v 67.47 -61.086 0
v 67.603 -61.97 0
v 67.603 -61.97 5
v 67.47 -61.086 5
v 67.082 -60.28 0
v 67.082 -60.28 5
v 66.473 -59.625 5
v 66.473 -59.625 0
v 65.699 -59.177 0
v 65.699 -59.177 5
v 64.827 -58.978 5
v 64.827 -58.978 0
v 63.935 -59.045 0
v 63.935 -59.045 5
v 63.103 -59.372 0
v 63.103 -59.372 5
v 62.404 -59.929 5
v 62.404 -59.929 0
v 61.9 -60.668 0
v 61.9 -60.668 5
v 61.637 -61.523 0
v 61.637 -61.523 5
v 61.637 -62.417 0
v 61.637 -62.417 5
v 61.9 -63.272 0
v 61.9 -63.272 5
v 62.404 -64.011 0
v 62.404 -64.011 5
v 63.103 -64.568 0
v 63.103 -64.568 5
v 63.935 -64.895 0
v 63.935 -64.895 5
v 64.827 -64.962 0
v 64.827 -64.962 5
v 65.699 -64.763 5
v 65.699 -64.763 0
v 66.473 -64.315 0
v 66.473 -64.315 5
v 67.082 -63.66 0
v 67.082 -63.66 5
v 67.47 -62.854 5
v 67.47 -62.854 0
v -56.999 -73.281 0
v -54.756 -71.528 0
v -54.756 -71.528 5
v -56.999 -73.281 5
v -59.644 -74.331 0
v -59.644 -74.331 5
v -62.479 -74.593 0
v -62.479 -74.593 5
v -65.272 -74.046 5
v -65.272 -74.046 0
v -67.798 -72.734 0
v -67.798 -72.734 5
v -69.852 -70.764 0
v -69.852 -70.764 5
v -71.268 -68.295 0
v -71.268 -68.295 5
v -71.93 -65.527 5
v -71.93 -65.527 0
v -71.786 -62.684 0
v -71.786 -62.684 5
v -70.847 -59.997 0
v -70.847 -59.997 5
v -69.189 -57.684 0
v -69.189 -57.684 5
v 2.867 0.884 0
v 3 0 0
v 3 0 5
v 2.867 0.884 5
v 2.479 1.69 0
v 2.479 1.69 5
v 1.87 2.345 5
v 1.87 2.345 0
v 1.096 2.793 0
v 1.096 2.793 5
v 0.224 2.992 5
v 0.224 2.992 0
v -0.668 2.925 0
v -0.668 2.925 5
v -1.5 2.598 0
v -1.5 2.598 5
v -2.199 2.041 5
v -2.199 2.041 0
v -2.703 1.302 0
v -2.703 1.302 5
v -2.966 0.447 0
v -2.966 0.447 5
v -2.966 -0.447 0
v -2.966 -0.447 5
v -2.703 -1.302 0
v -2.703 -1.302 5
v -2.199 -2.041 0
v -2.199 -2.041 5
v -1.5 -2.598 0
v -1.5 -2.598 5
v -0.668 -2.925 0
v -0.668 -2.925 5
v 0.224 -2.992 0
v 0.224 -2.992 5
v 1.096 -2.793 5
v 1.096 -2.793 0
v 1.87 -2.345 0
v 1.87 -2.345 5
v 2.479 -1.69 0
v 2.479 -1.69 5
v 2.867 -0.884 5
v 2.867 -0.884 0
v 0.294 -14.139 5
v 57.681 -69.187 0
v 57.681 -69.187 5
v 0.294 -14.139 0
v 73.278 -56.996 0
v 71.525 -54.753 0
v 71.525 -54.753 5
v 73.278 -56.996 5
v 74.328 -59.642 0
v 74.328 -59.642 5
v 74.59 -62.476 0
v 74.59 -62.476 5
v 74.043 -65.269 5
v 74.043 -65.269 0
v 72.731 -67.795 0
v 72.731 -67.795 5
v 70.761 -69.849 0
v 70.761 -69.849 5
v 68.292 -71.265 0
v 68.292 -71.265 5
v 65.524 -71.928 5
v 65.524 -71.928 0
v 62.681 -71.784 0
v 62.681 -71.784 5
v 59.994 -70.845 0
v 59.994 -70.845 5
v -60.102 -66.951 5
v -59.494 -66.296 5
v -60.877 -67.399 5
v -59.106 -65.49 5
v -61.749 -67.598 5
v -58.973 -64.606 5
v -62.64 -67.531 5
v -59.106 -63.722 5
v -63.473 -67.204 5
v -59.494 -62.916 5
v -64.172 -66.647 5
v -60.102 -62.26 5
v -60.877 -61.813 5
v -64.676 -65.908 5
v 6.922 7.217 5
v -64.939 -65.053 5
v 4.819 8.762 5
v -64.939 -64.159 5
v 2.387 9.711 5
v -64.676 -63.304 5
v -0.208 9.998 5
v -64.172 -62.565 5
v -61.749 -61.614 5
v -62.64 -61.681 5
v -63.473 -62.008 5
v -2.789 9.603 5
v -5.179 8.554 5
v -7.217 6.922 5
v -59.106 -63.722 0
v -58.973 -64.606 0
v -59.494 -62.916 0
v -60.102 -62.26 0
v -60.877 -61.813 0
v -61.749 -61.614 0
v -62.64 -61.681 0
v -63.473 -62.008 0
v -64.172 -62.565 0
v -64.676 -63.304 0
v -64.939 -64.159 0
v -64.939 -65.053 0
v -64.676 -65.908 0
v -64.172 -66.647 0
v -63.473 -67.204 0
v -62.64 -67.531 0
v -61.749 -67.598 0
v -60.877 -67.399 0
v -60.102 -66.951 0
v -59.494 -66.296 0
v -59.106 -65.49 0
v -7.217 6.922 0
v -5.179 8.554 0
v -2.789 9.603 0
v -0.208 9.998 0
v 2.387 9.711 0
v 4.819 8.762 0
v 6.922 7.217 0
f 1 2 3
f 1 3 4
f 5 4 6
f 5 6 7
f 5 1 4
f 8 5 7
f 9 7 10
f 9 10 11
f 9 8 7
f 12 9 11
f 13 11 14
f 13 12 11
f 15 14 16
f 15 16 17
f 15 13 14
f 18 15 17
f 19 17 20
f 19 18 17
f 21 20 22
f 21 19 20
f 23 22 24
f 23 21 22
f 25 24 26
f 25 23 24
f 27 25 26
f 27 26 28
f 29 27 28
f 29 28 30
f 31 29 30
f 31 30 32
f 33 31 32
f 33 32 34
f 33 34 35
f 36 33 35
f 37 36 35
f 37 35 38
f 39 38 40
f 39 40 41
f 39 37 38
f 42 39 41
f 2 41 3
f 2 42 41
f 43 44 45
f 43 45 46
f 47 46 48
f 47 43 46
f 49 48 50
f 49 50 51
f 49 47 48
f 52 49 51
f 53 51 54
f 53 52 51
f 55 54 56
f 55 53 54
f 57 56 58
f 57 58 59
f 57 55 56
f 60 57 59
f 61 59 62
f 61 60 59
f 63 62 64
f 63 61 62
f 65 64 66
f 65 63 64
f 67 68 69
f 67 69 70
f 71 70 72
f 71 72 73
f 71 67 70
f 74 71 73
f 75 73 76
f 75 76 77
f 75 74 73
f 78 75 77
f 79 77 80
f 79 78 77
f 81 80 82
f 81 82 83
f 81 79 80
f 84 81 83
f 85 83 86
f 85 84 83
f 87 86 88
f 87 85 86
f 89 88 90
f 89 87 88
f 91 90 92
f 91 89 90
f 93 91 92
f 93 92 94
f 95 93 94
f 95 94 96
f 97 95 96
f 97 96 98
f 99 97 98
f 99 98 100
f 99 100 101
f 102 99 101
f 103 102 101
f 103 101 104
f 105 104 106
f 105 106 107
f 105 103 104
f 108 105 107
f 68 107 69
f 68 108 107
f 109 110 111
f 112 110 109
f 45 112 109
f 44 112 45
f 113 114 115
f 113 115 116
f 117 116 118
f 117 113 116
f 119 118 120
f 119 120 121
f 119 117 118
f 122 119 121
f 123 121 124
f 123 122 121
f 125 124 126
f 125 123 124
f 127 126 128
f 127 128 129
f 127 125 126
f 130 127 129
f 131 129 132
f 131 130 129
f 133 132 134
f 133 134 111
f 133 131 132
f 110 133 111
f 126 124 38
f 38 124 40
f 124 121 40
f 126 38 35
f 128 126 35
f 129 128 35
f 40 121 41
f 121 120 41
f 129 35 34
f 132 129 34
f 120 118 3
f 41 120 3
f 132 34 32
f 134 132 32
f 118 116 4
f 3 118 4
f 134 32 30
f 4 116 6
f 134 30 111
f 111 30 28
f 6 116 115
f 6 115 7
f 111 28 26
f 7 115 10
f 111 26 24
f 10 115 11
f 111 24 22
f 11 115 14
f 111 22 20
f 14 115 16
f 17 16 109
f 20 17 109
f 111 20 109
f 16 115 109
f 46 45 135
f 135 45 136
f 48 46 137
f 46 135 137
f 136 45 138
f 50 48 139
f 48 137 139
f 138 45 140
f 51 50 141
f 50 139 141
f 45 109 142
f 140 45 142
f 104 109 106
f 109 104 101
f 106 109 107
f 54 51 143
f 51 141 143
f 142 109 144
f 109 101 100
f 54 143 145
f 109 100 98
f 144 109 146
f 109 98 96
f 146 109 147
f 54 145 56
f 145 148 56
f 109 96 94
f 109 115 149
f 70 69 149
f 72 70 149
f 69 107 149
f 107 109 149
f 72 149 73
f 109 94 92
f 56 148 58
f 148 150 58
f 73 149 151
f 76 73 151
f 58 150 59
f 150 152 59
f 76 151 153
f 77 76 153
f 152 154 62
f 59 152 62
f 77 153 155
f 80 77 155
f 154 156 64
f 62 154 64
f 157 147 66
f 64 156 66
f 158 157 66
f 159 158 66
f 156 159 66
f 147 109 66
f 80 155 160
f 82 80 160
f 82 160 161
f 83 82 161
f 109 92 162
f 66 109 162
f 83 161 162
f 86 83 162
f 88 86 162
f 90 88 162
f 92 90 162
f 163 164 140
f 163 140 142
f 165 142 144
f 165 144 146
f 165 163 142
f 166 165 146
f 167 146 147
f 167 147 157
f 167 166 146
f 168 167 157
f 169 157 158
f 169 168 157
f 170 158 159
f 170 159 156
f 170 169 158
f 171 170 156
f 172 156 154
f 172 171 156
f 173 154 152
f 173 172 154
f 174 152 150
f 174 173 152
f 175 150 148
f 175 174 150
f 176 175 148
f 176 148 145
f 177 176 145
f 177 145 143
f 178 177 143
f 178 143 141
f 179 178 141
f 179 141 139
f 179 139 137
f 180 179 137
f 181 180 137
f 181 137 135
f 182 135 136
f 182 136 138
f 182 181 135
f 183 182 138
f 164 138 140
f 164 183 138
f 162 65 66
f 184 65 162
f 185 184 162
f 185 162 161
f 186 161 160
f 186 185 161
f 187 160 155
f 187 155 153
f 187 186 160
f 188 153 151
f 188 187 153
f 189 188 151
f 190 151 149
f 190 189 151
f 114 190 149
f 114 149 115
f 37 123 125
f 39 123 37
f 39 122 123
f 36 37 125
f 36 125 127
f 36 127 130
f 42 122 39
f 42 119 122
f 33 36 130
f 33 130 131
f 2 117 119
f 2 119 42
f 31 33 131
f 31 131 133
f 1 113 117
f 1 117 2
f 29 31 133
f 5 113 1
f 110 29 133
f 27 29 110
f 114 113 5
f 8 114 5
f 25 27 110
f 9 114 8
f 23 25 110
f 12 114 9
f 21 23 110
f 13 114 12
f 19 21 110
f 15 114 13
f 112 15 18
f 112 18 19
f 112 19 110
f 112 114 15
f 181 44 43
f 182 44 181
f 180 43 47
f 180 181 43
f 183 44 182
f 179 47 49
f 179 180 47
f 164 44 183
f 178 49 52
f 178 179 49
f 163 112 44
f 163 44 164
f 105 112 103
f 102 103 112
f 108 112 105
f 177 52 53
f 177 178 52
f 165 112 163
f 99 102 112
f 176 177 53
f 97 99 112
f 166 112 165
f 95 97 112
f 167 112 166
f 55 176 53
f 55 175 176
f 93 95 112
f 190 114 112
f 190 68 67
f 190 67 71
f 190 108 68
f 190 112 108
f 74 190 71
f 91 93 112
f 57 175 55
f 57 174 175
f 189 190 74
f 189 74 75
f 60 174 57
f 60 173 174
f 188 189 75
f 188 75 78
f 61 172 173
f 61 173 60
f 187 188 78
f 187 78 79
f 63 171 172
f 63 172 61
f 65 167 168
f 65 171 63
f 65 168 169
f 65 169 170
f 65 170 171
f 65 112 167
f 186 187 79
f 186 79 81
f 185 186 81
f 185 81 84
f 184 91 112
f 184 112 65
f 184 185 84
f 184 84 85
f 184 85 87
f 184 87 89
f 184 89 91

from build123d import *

# Parameters (mm, degrees)
SKETCH1_R           = 3
BOSS_EXTRUDE2_DEPTH = 5


with BuildPart() as part:
    # Sketch1 → Boss-Extrude2 (new body)
    with BuildSketch(Plane.XY):
        with BuildLine():
            Line((0.29412641, -14.13907669), (-54.75624353, -71.528460831))
            ThreePointArc((-54.75624353, -71.528460831), (-68.895320221, -71.822587241), (-69.18944663, -57.68351055))
            Line((-69.18944663, -57.68351055), (-7.21660155, 6.92247514))
            ThreePointArc((-7.21660155, 6.92247514), (-0.207978779, 9.997837007), (6.92247514, 7.21660155))
            Line((6.92247514, 7.21660155), (71.525492216, -54.753395907))
            ThreePointArc((71.525492216, -54.753395907), (71.819618625, -68.892472597), (57.680541935, -69.186599007))
            Line((57.680541935, -69.186599007), (0.29412641, -14.13907669))
        make_face()
        with Locations((-61.97284508, -64.605985691)):
            Circle(SKETCH1_R, mode=Mode.SUBTRACT)
        with Locations((64.603017075, -61.969997457)):
            Circle(SKETCH1_R, mode=Mode.SUBTRACT)
        Circle(SKETCH1_R, mode=Mode.SUBTRACT)
    extrude(amount=BOSS_EXTRUDE2_DEPTH)


solid = part.part
